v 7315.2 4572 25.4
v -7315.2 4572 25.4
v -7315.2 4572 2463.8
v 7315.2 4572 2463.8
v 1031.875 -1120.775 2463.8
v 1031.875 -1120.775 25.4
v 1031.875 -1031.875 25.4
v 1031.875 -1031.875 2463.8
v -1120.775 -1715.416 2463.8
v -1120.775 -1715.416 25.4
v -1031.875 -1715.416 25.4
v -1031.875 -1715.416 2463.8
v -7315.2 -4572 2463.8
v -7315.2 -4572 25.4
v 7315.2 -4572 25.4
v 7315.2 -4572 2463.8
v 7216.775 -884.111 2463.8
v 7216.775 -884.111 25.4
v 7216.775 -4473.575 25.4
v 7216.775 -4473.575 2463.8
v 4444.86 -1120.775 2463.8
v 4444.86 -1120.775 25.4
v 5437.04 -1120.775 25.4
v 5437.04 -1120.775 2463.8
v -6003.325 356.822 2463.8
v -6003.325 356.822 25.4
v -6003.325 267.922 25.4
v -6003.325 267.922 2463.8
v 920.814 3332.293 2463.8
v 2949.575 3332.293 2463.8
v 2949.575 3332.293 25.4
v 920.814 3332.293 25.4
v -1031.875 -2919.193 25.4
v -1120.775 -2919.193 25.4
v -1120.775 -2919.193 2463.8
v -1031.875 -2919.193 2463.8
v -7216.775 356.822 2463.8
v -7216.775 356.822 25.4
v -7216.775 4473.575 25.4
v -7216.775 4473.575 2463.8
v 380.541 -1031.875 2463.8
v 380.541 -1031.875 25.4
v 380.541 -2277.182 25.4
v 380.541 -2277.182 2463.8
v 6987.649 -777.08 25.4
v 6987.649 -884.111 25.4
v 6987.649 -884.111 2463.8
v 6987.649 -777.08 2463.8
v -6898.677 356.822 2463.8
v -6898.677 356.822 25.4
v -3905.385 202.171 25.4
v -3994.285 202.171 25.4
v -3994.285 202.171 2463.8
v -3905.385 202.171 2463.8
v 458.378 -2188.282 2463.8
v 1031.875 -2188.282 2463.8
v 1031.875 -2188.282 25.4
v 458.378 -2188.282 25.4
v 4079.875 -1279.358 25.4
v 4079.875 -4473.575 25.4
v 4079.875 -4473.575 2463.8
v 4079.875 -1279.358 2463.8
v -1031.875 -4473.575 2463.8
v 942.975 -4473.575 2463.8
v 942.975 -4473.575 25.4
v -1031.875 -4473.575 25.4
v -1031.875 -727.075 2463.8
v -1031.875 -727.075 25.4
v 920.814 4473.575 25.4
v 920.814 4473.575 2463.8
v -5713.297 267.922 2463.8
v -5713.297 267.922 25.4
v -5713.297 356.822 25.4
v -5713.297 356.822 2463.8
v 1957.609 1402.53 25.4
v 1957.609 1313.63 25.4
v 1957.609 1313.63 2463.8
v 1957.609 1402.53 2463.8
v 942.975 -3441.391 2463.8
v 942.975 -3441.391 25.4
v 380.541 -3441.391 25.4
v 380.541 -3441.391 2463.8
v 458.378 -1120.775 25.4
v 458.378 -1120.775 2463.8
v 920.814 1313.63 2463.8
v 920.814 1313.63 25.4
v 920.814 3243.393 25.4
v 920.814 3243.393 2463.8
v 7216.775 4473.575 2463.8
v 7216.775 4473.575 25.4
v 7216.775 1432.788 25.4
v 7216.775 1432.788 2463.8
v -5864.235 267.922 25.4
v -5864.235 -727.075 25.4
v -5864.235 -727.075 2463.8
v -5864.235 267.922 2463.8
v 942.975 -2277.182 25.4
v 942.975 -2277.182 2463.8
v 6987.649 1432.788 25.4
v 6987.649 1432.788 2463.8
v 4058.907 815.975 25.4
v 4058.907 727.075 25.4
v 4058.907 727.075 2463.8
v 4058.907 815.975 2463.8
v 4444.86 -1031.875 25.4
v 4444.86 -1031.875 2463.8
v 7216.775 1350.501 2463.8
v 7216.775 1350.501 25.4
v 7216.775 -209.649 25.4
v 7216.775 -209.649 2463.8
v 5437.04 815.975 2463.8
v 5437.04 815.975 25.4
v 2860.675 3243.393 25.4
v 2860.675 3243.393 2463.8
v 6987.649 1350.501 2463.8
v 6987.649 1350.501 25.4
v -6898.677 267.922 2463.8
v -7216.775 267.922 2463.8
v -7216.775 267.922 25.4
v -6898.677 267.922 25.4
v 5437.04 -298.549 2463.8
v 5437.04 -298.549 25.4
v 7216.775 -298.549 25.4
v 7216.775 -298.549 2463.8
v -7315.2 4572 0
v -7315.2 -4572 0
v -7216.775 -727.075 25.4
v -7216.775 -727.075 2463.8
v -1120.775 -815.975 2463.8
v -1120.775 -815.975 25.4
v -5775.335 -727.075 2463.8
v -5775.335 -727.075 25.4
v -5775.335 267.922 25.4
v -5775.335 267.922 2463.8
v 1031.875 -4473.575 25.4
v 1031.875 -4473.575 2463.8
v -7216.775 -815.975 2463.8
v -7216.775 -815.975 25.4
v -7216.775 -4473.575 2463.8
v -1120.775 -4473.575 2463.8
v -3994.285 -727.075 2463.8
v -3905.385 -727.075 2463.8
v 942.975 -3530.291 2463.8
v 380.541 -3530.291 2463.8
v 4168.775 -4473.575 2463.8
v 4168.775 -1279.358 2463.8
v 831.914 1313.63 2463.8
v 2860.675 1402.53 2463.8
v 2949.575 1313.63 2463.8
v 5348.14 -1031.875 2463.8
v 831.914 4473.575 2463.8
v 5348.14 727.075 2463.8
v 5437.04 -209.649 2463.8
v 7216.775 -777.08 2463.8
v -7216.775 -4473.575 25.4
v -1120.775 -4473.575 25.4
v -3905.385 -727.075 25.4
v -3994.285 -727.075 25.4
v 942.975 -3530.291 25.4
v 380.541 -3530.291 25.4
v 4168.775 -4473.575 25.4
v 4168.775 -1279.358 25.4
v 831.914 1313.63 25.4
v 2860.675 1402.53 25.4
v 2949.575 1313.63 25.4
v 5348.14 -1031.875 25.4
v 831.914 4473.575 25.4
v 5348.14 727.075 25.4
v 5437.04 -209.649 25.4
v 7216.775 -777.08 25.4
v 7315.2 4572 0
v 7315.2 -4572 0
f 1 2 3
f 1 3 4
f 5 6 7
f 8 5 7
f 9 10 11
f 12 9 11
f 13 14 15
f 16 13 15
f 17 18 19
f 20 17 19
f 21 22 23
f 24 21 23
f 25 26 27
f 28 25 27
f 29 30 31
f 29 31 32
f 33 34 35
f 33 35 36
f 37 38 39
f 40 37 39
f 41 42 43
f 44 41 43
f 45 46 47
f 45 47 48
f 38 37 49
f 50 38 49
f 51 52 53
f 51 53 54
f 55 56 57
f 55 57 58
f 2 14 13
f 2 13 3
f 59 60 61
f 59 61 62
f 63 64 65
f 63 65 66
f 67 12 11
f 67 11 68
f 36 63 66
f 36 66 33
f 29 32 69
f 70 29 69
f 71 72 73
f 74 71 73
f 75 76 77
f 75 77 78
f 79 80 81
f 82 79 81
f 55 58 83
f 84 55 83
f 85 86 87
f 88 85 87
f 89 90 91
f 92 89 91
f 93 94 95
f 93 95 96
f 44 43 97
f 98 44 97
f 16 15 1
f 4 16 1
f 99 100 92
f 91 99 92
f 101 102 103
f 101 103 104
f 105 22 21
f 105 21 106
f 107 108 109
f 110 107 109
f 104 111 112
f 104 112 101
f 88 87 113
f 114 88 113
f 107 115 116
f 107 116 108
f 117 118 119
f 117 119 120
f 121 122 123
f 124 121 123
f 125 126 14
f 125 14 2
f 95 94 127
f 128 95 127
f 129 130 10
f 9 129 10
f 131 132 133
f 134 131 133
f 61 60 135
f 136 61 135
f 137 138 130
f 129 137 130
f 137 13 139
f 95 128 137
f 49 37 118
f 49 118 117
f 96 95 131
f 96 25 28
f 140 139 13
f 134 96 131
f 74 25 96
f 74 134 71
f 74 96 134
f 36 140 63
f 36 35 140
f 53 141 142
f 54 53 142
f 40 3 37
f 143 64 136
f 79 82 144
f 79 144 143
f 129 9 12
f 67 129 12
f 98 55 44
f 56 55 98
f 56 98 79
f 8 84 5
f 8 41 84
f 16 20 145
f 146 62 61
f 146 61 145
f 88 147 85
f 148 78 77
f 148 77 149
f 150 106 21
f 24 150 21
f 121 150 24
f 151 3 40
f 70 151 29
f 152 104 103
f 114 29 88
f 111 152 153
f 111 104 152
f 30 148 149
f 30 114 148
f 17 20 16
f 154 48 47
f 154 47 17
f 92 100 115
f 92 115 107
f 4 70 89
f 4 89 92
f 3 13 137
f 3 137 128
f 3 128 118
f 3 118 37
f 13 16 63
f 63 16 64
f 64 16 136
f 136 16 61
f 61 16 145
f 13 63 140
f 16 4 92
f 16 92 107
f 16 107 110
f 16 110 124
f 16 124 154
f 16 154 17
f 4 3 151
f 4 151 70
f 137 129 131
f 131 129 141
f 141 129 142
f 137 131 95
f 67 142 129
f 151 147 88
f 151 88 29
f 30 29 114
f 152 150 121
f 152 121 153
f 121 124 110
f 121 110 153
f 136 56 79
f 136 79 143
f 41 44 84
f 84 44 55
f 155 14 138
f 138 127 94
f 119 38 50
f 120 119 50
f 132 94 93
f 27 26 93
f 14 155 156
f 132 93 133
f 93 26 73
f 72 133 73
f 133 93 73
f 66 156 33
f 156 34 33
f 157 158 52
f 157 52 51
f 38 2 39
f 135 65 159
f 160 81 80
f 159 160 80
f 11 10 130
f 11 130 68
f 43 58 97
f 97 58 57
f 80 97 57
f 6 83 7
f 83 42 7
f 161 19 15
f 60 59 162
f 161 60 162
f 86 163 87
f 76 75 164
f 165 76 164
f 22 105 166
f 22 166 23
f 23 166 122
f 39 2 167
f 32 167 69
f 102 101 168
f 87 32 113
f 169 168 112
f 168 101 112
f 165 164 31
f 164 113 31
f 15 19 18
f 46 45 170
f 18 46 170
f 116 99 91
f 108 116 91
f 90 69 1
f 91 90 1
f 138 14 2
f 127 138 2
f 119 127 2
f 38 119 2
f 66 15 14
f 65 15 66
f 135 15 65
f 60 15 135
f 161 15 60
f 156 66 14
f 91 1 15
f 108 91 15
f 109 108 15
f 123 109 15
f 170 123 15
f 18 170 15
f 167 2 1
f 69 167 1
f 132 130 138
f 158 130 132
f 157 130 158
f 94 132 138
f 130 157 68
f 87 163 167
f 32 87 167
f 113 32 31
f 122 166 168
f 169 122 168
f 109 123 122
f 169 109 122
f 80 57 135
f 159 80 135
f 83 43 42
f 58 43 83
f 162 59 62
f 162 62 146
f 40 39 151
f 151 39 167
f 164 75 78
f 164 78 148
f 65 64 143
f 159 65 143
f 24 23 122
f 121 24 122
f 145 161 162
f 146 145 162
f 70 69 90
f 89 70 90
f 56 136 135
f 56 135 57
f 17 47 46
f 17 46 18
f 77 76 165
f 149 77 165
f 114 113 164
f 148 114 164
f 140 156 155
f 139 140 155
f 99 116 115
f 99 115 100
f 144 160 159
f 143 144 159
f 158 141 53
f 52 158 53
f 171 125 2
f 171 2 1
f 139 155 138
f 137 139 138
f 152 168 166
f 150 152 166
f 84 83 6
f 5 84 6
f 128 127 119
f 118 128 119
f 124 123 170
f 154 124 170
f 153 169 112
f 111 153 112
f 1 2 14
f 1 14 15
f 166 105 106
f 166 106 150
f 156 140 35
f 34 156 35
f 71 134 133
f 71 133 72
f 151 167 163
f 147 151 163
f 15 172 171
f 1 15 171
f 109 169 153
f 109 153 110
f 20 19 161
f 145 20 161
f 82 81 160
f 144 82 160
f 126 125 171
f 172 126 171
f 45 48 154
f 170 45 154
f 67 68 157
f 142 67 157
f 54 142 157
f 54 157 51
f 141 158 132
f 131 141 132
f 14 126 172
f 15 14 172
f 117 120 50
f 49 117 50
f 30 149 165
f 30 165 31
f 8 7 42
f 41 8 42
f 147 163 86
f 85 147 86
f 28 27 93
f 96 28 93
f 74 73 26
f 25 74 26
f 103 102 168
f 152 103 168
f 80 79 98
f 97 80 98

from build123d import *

# Parameters (mm, degrees)
F0_W     = 14630.4
F0_H     = 9144
F1_DEPTH = 25.4
F2_W     = 14630.4
F2_H     = 9144
F2_W_2   = 88.9
F2_H_2   = 3194.2168514252
F2_H_3   = 1929.7631978989
F2_W_3   = 1779.7346710205
F2_H_4   = 88.9
F2_H_5   = 1554.3824474335
F2_W_4   = 1289.2332969666
F2_H_6   = 1164.2087398529
F2_H_7   = 1141.2822940826
F2_H_8   = 994.9972226143
F2_H_9   = 943.2841579437
F2_W_5   = 77.8362154961
F2_H_10  = 1067.5071022034
F2_H_11  = 929.2460680008
F2_W_6   = 903.2808242798
F2_W_7   = 903.0658233643
F2_W_8   = 318.0981277466
F2_W_9   = 229.1255592346
F2_H_12  = 107.0315241814
F2_H_13  = 82.2870731354
F3_DEPTH = 2438.4


with BuildPart() as f1:
    # F0 (on Top) → F1 (new body)
    with BuildSketch(Plane.XY):
        Rectangle(F0_W, F0_H)
    extrude(amount=F1_DEPTH)


with BuildPart() as f3:
    # F2 (on face) → F3 (new body)
    with BuildSketch(Plane.XY.offset(25.4)):
        Rectangle(F2_W, F2_H)
        Polygon((-7216.775, 356.8222226143), (-7216.775, 4473.575), (831.9140672684, 4473.575), (920.8140672684, 4473.575), (7216.775, 4473.575), (7216.775, 1432.7878952026), (7216.775, 1350.5008220673), (7216.775, -209.6492750645), (7216.775, -298.5492750645), (7216.775, -777.0798206329), (7216.775, -884.1113448143), (7216.775, -4473.575), (4168.775, -4473.575), (4079.875, -4473.575), (1031.875, -4473.575), (942.975, -4473.575), (-1031.875, -4473.575), (-1120.775, -4473.575), (-7216.775, -4473.575), (-7216.775, -815.975), (-7216.775, -727.075), (-7216.775, 267.9222226143), align=None, mode=Mode.SUBTRACT)
        Polygon((-5864.2349243164, -727.075), (-7216.775, -727.075), (-7216.775, -815.975), (-1120.775, -815.975), (-1120.775, -727.075), (-3905.3846298218, -727.075), (-3994.2846298218, -727.075), (-5775.3349243164, -727.075), align=None)
        with Locations((4124.325, -2876.4665742874)):
            Rectangle(F2_W_2, F2_H_2)
        Polygon((920.8140672684, 3332.2927059174), (831.9140672684, 3332.2927059174), (831.9140672684, 3243.3927059174), (920.8140672684, 3243.3927059174), (2860.675, 3243.3927059174), (2860.675, 3332.2927059174), align=None)
        Polygon((2949.575, 3332.2927059174), (2860.675, 3332.2927059174), (2860.675, 3243.3927059174), (2860.675, 1402.5295080185), (2860.675, 1313.6295080185), (2949.575, 1313.6295080185), align=None)
        Polygon((5437.0403289795, -298.5492750645), (5437.0403289795, -209.6492750645), (5437.0403289795, 815.975), (5348.1403289795, 815.975), (5348.1403289795, 727.075), (5348.1403289795, -1031.875), (5348.1403289795, -1120.775), (5437.0403289795, -1120.775), align=None)
        with Locations((876.3640672684, 2278.5111069679)):
            Rectangle(F2_W_2, F2_H_3)
        with Locations((6326.9076644897, -254.0992750645)):
            Rectangle(F2_W_3, F2_H_4)
        with Locations((-1076.325, -3696.3837762833)):
            Rectangle(F2_W_2, F2_H_5)
        with Locations((4703.5236804962, 771.525)):
            Rectangle(F2_W_4, F2_H_4)
        with Locations((987.425, -2859.2864721298)):
            Rectangle(F2_W_2, F2_H_6)
        with Locations((876.3640672684, 3902.9338529587)):
            Rectangle(F2_W_2, F2_H_7)
        with Locations((-5819.7849243164, -229.5763886929)):
            Rectangle(F2_W_2, F2_H_8)
        Polygon((-1120.775, -727.075), (-1120.775, -815.975), (-1120.775, -1715.415596962), (-1031.875, -1715.415596962), (-1031.875, -727.075), align=None)
        with Locations((987.425, -4001.9329210281)):
            Rectangle(F2_W_2, F2_H_9)
        with Locations((419.4595217705, -1654.5285511017)):
            Rectangle(F2_W_5, F2_H_10)
        with Locations((-3949.8346298218, -262.4519659996)):
            Rectangle(F2_W_2, F2_H_11)
        with Locations((4896.4999168396, -1076.325)):
            Rectangle(F2_W_6, F2_H_4)
        with Locations((2409.1420883179, 1358.0795080185)):
            Rectangle(F2_W_7, F2_H_4)
        Polygon((380.5414140224, -3530.2908420563), (942.975, -3530.2908420563), (1031.875, -3530.2908420563), (1031.875, -3441.3908420563), (942.975, -3441.3908420563), (380.5414140224, -3441.3908420563), align=None)
        Polygon((942.975, -2277.1821022034), (1031.875, -2277.1821022034), (1031.875, -2188.2821022034), (458.3776295185, -2188.2821022034), (380.5414140224, -2188.2821022034), (380.5414140224, -2277.1821022034), align=None)
        Polygon((380.5414140224, -1120.775), (458.3776295185, -1120.775), (1031.875, -1120.775), (1031.875, -1031.875), (380.5414140224, -1031.875), align=None)
        with Locations((-7057.7259361267, 312.3722226143)):
            Rectangle(F2_W_8, F2_H_4)
        Polygon((-6003.3254623413, 267.9222226143), (-5864.2349243164, 267.9222226143), (-5775.3349243164, 267.9222226143), (-5713.2968902588, 267.9222226143), (-5713.2968902588, 356.8222226143), (-6003.3254623413, 356.8222226143), align=None)
        with Locations((7102.2122203827, -830.5955827236)):
            Rectangle(F2_W_9, F2_H_12)
        with Locations((7102.2122203827, 1391.6443586349)):
            Rectangle(F2_W_9, F2_H_13)
    extrude(amount=F3_DEPTH)


solid = Compound([f1.part, f3.part])
